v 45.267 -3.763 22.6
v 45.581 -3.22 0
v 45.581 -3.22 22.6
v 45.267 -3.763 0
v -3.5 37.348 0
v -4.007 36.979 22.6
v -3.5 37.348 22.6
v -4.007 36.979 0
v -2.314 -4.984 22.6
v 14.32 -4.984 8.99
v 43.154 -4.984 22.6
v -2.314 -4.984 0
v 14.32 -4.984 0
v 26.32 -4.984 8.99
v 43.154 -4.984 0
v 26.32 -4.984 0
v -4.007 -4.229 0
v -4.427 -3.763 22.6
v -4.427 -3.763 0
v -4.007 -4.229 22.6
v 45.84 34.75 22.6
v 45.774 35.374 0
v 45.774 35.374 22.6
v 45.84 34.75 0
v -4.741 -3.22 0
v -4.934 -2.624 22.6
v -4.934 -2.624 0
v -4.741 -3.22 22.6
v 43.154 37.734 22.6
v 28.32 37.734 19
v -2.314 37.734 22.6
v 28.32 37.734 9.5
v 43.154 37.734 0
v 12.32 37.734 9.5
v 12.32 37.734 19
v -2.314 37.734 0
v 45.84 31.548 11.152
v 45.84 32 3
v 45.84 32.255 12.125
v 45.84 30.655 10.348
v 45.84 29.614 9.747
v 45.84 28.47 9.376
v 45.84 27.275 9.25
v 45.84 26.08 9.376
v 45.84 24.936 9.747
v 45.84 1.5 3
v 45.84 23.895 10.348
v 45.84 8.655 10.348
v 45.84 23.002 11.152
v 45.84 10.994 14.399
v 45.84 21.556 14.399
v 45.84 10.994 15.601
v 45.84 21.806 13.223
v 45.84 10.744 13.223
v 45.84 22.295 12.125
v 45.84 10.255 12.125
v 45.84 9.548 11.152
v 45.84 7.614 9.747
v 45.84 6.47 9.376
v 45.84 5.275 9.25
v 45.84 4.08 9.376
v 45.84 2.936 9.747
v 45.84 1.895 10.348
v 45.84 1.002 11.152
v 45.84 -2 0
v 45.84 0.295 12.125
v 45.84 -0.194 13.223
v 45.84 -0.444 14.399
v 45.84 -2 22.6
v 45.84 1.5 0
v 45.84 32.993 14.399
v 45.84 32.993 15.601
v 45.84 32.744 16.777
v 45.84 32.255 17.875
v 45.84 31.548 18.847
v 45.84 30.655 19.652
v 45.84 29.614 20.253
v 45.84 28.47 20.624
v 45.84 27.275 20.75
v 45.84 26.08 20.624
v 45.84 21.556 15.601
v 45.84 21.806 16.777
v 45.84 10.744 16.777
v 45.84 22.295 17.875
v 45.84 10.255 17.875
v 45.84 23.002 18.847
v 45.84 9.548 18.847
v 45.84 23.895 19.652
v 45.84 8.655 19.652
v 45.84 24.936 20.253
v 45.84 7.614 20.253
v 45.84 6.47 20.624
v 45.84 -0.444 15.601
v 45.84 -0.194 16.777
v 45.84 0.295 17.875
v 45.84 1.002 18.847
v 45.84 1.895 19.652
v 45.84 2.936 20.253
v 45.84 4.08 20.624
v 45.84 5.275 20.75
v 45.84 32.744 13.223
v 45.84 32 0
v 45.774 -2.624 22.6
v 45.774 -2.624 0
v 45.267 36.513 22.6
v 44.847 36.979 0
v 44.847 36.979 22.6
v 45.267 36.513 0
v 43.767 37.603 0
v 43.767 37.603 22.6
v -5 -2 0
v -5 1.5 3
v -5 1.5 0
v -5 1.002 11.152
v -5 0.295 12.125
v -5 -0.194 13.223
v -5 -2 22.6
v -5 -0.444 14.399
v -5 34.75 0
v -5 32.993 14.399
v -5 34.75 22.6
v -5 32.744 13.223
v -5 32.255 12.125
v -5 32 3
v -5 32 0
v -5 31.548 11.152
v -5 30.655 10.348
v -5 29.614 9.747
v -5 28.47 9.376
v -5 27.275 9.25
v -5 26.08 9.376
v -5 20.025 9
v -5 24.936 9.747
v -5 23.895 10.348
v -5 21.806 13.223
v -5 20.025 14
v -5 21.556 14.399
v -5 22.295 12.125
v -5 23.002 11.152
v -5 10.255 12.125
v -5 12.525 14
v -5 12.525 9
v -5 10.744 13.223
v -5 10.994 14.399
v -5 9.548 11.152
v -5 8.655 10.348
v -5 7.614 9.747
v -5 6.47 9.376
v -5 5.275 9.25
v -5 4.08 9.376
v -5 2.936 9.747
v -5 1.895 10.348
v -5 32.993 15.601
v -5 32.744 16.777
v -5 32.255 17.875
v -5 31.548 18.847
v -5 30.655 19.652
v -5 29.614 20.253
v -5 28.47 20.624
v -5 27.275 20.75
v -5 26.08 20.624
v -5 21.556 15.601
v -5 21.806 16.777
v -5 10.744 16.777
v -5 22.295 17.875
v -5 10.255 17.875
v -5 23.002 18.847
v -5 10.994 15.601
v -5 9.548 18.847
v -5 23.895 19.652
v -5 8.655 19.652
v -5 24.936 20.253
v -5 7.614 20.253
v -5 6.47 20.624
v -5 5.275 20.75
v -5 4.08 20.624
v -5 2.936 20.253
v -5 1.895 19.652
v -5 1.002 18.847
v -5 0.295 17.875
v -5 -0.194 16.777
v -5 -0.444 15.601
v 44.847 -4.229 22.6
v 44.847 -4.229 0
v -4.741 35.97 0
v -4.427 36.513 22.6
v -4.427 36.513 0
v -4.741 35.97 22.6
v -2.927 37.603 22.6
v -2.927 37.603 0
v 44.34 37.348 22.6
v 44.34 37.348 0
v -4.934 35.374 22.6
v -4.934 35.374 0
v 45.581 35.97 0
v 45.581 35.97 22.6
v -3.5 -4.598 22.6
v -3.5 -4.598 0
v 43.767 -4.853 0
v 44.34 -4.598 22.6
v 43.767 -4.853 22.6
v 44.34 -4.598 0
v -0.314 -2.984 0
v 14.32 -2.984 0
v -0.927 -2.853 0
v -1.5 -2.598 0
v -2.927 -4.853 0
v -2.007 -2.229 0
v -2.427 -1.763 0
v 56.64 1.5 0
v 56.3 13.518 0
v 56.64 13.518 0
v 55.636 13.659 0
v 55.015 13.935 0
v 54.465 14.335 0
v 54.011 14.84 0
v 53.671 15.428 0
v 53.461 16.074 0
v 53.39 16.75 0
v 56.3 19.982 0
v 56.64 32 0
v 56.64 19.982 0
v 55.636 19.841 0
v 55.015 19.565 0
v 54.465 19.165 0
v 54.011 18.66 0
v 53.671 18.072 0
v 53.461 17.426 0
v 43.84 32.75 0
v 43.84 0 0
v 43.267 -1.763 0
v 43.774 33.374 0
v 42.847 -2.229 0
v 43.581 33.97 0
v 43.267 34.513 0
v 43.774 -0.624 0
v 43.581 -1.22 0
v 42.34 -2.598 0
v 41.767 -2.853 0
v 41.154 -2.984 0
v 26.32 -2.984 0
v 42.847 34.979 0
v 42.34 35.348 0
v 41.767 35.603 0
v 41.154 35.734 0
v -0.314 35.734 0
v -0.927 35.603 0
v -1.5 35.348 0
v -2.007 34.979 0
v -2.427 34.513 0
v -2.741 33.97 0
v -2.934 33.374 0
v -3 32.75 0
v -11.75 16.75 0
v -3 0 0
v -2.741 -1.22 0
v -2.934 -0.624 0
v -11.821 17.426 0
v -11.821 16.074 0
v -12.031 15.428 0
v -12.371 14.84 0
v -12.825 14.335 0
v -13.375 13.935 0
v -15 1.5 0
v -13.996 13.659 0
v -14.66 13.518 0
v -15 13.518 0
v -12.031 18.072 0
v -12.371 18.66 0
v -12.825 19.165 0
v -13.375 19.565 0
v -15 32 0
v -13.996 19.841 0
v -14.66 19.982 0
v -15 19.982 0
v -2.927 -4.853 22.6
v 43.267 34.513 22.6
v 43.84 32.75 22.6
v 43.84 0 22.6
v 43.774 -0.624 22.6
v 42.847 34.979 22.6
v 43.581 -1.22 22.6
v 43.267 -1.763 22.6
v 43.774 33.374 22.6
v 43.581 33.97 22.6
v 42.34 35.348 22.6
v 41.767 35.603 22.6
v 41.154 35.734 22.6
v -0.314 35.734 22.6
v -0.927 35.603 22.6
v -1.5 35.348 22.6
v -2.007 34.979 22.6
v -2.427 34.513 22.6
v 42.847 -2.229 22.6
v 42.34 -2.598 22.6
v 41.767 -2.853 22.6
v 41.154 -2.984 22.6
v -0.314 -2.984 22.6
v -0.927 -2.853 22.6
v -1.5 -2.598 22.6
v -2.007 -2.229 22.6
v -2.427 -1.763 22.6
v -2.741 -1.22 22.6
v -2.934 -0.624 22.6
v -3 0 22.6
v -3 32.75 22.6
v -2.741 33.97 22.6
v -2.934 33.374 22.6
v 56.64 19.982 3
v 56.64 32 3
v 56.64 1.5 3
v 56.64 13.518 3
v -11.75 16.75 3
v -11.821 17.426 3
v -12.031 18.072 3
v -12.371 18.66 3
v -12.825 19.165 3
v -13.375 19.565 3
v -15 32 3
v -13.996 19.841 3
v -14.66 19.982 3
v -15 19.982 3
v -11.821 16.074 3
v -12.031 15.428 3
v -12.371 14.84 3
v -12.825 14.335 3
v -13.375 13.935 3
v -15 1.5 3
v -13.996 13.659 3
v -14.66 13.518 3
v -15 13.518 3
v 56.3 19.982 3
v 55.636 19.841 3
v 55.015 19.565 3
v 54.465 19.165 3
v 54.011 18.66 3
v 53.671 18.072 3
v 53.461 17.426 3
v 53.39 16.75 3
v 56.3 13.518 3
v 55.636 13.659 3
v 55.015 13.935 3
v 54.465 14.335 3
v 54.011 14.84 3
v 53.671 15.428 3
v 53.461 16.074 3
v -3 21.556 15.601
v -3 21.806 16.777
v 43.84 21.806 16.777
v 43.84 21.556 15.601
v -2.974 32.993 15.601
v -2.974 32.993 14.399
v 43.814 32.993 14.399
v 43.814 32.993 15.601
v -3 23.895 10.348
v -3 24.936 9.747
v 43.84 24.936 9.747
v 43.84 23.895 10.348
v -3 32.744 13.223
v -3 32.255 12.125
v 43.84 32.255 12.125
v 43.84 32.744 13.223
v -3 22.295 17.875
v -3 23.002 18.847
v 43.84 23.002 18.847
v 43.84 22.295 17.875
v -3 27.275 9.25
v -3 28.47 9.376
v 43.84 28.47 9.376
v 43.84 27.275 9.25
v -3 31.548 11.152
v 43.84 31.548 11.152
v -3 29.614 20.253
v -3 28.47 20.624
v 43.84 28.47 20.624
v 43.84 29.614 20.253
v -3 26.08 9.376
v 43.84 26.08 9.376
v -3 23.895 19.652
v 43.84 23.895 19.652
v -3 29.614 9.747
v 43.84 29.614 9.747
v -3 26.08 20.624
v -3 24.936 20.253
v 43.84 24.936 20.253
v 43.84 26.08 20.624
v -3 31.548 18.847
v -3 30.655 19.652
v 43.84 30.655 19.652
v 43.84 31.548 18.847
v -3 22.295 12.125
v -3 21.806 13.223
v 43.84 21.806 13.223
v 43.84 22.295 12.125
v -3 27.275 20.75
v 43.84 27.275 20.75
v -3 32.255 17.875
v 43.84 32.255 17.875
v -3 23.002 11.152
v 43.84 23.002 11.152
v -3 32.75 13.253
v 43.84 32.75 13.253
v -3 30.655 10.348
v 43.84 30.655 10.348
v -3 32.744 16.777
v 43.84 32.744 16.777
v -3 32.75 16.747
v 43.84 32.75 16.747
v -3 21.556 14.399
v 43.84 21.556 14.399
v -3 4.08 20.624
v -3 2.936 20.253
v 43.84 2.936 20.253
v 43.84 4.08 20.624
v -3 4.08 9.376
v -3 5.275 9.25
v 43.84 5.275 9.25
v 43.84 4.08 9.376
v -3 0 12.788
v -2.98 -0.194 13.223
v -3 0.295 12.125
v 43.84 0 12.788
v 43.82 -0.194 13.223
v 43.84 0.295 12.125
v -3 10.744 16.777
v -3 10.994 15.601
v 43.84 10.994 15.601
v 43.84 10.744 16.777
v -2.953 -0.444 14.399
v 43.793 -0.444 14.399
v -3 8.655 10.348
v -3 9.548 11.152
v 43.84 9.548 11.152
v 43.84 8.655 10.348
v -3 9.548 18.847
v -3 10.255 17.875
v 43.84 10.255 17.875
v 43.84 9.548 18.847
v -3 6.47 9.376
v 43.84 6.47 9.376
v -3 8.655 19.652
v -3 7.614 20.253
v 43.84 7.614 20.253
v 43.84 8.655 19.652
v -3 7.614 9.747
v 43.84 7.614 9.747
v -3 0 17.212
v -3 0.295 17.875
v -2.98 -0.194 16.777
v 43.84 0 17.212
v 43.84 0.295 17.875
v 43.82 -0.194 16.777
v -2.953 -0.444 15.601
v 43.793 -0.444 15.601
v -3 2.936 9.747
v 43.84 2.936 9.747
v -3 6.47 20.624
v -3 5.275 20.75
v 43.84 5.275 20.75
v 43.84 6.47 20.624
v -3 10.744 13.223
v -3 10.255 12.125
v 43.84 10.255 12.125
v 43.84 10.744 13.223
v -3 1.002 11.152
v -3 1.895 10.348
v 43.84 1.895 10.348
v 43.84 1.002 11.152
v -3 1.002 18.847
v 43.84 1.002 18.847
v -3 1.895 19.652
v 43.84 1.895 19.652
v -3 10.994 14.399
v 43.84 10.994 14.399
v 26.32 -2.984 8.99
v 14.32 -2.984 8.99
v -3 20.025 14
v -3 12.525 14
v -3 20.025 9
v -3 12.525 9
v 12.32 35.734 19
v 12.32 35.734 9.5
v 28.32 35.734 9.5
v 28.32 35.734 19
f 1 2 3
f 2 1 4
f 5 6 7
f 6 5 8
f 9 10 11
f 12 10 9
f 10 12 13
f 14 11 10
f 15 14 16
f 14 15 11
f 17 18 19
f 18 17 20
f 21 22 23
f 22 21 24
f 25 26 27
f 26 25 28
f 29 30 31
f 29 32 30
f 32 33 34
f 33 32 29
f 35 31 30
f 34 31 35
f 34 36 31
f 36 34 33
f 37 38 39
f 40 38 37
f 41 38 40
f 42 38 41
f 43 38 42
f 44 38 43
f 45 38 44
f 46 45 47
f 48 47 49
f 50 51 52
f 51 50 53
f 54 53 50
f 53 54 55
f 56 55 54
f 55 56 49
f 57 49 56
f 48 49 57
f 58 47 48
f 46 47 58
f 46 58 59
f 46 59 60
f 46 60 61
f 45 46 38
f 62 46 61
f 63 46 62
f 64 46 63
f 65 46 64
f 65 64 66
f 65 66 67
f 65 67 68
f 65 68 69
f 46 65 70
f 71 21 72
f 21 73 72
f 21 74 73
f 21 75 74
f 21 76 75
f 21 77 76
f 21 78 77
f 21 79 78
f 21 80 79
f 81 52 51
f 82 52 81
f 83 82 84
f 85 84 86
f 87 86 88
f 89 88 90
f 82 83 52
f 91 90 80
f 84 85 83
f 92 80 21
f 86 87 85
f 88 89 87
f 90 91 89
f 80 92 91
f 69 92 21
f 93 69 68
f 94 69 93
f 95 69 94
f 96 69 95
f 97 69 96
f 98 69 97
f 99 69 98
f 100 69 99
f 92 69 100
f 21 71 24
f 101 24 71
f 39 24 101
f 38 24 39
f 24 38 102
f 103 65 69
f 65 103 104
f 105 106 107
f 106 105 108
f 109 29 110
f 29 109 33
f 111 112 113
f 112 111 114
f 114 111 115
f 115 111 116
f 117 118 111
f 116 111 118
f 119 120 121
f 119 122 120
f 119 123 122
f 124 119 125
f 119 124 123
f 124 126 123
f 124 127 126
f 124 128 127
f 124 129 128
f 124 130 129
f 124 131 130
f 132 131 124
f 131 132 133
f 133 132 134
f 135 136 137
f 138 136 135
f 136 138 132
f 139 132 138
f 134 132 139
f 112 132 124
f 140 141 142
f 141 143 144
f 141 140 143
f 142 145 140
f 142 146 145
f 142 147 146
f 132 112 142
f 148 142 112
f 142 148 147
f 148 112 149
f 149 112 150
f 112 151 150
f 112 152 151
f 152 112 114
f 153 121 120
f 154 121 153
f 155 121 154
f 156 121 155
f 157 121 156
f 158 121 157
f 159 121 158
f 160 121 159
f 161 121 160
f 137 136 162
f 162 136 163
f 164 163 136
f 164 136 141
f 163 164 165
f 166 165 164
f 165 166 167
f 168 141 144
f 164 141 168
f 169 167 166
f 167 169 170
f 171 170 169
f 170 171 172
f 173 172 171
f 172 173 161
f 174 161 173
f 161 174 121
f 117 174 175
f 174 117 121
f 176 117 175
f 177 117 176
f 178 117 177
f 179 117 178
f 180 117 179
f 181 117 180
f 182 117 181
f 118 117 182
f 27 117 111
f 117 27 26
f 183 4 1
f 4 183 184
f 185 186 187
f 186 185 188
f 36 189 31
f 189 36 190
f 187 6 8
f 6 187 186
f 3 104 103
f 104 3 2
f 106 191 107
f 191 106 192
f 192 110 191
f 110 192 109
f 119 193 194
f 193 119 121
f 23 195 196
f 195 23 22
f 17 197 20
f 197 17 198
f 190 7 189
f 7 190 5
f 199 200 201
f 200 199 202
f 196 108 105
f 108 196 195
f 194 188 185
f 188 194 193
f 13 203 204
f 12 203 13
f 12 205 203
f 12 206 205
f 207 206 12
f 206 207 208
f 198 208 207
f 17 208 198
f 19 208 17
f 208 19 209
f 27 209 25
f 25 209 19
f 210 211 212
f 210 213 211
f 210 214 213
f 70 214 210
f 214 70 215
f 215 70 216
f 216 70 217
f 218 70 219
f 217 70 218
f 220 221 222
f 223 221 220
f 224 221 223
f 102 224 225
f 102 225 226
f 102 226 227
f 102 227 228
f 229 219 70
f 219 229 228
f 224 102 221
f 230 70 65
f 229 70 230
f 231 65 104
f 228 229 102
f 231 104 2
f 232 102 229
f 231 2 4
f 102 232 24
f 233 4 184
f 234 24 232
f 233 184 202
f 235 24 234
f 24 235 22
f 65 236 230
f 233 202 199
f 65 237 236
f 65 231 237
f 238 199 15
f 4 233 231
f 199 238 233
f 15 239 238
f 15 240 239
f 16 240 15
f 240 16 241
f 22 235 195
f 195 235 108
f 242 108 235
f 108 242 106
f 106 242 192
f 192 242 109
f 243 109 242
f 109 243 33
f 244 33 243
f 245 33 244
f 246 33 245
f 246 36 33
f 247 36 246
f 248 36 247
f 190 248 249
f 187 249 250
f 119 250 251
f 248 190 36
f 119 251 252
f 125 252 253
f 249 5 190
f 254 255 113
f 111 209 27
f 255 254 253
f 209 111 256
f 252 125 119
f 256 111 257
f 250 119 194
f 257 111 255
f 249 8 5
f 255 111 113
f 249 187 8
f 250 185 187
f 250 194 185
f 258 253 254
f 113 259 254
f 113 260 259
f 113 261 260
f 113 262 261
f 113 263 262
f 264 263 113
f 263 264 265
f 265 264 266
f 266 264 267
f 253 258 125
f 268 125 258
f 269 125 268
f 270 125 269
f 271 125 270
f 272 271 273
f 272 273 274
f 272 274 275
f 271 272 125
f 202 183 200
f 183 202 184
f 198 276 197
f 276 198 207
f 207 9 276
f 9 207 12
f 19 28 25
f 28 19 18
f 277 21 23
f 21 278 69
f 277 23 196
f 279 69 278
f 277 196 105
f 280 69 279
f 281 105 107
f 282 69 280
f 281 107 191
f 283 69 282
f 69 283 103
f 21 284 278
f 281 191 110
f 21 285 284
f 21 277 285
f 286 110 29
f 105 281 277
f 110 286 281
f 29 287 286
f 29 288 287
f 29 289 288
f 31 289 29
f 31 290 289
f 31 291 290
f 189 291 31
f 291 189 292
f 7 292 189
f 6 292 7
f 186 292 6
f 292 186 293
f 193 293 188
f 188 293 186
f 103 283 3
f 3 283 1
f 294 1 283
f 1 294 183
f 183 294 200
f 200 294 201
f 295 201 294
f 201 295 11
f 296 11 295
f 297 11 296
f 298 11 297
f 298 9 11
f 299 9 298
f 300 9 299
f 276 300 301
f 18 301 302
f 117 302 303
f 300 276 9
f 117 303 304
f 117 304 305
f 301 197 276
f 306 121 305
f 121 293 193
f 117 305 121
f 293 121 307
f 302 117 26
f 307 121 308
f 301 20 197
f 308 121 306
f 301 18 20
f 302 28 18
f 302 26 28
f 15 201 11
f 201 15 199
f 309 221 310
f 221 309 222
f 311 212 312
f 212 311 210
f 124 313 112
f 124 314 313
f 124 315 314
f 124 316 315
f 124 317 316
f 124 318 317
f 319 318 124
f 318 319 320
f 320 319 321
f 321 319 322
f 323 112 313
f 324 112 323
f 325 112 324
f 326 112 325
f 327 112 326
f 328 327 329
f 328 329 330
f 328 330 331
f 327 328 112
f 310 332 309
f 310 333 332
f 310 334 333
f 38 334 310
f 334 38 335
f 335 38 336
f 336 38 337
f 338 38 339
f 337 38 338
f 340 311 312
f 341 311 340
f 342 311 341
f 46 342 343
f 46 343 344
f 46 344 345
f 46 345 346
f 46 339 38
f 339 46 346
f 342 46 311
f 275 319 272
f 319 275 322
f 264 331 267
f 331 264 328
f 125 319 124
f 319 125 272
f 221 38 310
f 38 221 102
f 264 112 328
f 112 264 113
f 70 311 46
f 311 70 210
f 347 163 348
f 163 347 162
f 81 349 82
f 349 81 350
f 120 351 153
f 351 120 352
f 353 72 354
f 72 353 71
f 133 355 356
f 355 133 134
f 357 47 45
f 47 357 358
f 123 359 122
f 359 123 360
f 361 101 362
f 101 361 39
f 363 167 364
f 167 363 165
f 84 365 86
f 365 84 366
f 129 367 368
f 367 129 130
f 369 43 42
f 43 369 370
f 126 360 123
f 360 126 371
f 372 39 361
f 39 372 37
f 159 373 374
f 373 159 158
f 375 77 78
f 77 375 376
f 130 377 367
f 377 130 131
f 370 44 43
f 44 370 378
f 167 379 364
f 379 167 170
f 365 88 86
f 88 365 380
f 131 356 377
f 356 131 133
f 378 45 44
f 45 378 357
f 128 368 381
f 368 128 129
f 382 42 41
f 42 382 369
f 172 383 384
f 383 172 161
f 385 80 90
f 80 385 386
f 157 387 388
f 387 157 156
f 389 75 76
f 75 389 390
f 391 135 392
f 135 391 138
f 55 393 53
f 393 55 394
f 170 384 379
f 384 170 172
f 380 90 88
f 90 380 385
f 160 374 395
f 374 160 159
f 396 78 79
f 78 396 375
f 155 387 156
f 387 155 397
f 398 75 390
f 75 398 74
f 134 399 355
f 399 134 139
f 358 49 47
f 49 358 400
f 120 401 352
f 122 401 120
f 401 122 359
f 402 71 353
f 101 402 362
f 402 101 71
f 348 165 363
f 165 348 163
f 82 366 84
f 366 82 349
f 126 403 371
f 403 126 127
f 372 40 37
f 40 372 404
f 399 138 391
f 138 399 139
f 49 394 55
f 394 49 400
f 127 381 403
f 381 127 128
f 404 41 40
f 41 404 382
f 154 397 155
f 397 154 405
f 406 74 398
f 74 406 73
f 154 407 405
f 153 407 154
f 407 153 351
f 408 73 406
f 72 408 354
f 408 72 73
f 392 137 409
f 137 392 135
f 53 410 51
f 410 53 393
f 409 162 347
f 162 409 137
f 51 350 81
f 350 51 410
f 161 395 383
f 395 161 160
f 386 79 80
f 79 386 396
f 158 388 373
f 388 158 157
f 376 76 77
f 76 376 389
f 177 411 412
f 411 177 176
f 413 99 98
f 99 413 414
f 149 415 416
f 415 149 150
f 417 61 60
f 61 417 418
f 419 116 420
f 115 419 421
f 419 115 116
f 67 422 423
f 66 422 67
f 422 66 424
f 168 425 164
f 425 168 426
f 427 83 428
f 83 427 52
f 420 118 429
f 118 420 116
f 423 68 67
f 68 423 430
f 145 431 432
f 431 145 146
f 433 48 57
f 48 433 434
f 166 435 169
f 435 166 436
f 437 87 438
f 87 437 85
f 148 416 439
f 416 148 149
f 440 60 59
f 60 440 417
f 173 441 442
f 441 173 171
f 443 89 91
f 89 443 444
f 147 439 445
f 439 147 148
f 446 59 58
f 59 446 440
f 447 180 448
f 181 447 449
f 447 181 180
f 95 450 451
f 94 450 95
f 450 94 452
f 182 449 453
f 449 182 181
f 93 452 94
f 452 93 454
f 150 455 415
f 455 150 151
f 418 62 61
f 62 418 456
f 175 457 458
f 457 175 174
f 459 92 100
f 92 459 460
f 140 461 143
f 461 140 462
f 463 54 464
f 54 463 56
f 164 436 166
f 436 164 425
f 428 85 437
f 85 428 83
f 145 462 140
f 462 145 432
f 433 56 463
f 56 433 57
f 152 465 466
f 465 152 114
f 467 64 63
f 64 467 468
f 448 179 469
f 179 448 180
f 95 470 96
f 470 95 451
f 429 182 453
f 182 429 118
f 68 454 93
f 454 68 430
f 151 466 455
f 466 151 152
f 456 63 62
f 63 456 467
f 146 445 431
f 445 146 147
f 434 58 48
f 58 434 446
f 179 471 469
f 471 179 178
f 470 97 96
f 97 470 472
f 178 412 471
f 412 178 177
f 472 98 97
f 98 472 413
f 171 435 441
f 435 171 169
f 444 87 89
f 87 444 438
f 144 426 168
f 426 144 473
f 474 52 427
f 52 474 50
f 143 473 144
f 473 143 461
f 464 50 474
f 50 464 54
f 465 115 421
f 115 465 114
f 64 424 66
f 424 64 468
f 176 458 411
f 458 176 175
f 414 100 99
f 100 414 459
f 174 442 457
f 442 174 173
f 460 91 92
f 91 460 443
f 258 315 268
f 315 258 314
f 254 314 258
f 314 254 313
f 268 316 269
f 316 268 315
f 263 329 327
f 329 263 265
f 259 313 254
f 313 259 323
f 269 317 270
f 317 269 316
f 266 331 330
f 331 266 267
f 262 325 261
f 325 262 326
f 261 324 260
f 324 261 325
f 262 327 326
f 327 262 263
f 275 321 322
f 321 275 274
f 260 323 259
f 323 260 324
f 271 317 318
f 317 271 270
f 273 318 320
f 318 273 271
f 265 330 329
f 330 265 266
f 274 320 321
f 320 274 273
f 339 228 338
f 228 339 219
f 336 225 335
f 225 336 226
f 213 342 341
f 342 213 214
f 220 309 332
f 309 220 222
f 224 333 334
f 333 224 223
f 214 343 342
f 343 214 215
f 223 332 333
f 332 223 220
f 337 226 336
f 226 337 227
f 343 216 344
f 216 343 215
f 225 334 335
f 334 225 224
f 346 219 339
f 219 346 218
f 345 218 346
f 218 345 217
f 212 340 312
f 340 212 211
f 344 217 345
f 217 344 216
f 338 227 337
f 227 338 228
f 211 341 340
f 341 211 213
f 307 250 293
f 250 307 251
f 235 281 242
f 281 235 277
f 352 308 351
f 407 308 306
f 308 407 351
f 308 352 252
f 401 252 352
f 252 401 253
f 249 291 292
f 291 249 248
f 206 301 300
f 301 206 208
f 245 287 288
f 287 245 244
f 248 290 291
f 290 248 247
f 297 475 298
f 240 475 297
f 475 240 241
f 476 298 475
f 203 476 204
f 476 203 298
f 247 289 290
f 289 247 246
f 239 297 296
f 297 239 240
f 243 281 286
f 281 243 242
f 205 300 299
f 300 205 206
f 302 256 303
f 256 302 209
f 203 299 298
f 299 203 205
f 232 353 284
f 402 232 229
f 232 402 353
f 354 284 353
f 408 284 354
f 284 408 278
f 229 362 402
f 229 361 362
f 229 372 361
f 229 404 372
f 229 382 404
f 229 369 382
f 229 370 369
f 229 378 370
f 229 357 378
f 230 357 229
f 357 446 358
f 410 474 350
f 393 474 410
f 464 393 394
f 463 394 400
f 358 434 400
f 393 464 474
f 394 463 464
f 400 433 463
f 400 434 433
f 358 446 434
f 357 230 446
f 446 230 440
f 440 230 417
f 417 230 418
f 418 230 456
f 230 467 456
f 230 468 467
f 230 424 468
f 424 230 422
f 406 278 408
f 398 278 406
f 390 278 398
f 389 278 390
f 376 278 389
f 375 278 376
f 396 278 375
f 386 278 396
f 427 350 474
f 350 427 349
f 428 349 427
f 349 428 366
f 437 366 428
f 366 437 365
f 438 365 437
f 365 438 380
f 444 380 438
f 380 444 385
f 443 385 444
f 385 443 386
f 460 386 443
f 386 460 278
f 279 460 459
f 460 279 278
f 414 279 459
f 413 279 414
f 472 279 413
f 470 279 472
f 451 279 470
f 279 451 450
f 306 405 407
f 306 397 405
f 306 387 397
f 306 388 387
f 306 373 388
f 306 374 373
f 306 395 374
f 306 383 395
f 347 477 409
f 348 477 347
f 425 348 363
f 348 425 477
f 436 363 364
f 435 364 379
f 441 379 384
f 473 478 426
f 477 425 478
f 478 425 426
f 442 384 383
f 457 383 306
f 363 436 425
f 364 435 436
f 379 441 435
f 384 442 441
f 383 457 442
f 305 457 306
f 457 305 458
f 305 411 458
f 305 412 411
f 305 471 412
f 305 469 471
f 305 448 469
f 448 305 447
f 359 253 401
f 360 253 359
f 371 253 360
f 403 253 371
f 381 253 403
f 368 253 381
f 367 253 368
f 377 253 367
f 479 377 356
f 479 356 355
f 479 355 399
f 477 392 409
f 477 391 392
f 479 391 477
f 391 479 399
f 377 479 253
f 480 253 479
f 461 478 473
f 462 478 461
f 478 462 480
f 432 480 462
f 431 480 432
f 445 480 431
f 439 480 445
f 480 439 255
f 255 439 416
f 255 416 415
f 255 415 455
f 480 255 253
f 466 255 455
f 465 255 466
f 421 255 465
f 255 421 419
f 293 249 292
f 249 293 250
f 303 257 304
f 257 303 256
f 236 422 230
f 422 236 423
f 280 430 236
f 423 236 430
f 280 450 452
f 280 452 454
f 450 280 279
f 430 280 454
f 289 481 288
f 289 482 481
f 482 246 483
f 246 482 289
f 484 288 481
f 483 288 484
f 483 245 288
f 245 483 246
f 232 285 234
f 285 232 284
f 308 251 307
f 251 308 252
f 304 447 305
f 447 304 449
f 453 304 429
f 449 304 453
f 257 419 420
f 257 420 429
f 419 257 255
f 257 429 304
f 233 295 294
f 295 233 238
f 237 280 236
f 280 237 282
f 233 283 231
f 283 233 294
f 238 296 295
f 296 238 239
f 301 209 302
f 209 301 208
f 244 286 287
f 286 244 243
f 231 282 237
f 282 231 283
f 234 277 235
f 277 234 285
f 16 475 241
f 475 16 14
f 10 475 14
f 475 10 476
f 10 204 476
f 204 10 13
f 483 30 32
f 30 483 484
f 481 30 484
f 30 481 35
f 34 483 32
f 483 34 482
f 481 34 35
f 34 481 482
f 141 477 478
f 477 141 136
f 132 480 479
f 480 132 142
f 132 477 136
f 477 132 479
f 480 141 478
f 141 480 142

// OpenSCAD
// file: ../parameters.scad
maximum_printable_size = 150;

layer_thickness = 0.2;
base_patern = 10;
global_clearance = 0.2;
clearance = global_clearance;


//Screw diameter and nut for M10 [mm]
M10_screw_diameter = 10.4;
M10_head_height = 10;
M10_head_diameter = 16+0.5;
M10_nut_height = 10.5;
M10_nut_diameter = 25.5;
M10_nut_pocket = 22.3;

//Screw diameter for M8 [mm]
M8_screw_diameter = 8.6;
M8_head_height = 8;
M8_head_diameter = 13.5;
M8_nut_height = 7.5;
M8_square_nut_thin_height = 4.5;
M8_nut_diameter = 14.4 + 0.5;
M8_nut_pocket = 13 + 0.5;
M8_washer_diameter = 16;
M8_washer_thickness = 1.5;


//Screw diameter and nut for M6 [mm]
M6_screw_diameter=6.5;
M6_head_diameter = 10+0.5;
M6_head_height = 6;
M6_nut_height = 4.9;
M6_nut_diameter = 11.8;
M6_nut_pocket = 10.4;
M6_square_nut_height = 3;
M6_square_nut_diameter = 10;
M6_washer_thickness = 1.6;

//Screw diameter and nut for M5 [mm]
M5_screw_diameter=5.5;
M5_head_height = 5;
M5_head_diameter = 13+0.5;
M5_nut_height = 4.5;
M5_nut_diameter = 9.4;
M5_nut_pocket = 8.4;

//Screw diameter and nut for M4 [mm]
M4_screw_diameter=4.5;
M4_screw_head_height = 4;
M4_nut_height = 3.2;
M4_nut_diameter = 8.4;
M4_nut_pocket = 7.5;

//Screw diameter and nut for M3 [mm]
M3_screw_diameter = 3.2;
M3_nut_height = 2.7;
M3_nut_diameter = 6.6;
M3_nut_pocket = 5.6;
M3_screw_head_height = 3;

//Screw diameter and nut for M2,5 [mm]
M2_5_screw_diameter = 2.7;
M2_5_nut_height = 2.3;
M2_5_nut_diameter = 6;
M2_5_nut_pocket = 5.5;

// kulove lozisko

bearing_efsm_08_h = 33+1;
bearing_efsm_08_m = 22;
bearing_efsm_08_db = 18;
bearing_efsm_08_ag = 10.5;
bearing_efsm_08_n = M4_screw_diameter;
bearing_efsm_08_a1 = 5.5;
bearing_efsm_08_d = 8.25;
bearing_efsm_08_B = 8; // ball height

bearing_efsm_10_h = 38+1;
bearing_efsm_10_m = 26;
bearing_efsm_10_db = 21.9;
bearing_efsm_10_ag = 12+0.2;
bearing_efsm_10_n = M5_screw_diameter;
bearing_efsm_10_a1 = 6.5;
bearing_efsm_10_d = 10.25;


bearing_efsm_12_width = 40+1;
bearing_efsm_12_h = bearing_efsm_12_width;
bearing_efsm_12_boltd = 28/2; // polovina vzdalenosti mezi srouby
bearing_efsm_12_m = bearing_efsm_12_boltd*2;
bearing_efsm_12_db = 25;
bearing_efsm_12_ag = 13;
bearing_efsm_12_a1 = 7;
bearing_efsm_12_n = M5_screw_diameter;
bearing_efsm_12_d = 12.15;
bearing_efsm_12_B = 10; // ball height
bearing_efsm_space = 1;

bearing_efsm_17_width = 54+1;
bearing_efsm_17_h = bearing_efsm_17_width;
bearing_efsm_17_boltd = 38/2; // polovina vzdalenosti mezi srouby
bearing_efsm_17_m = bearing_efsm_17_boltd*2;
bearing_efsm_17_db = 35;
bearing_efsm_17_ag = 18;
bearing_efsm_17_n = M6_screw_diameter;
bearing_efsm_17_a1 = 10;
bearing_efsm_17_B = 17; // ball height

//limcove lozisko
bearing_EFOM_10_L=26; //celkova sirka zakladny
bearing_EFOM_10_d1=10.3;//diametr otvoru real=10 mm
bearing_EFOM_10_dB=22;//diametr vystupku pro ulozeni lozika
bearing_EFOM_10_H=52;//celková delka zakladny
bearing_EFOM_10_J=36;// hole pitch
bearing_EFOM_10_A1=6.5;//vyska pouzdra
bearing_EFOM_10_Ag=12;//celkova vyska
bearing_EFOM_10_N1=5;//sirka otvoru pro sroub
bearing_EFOM_10_N2=8;//delka otvoru pro sroub
bearing_EFOM_10_m=36;//roztec der pro sroub
bearing_EFOM_10_h=9;//vyska lozika


608_bearing_outer_diameter = 22.3;
608_bearing_inner_diameter = 16;
608_bearing_thickness = 7.1;


// 20 KG servo parameters

servo_20kg_axis_offset = 9.375; // jak je osa mimo stredu
servo_20kg_body_x = 42;
servo_20kg_body_y = 21;
servo_20kg_body_z = 40;
servo_20kg_thread_x = 49/2;
servo_20kg_thread_y = 10/2;
servo_20kg_body_below = 10; // jak hluboko je tělo serva pod drzaky na srouby
servo_20kg_below = 25.8; // jak hluboko je páka serva pod drzaky na srouby

servo_20kg_bolt_d = 2.5+0.3;
servo_20kg_nut_d = 5+0.3;


//strain gauge
strain_gauge_width = 12.7;
strain_gauge_length = 75.1;
strain_gauge_screw_distance = 10;

//ALU profile
ALU_profile_width = 30.5;
ALU_profile_holder_wall_thickness = 3;
ALU_profile_groove_width = 8;

//pillow block bearing
//https://www.igus.eu/product/372
//Part no. KSTM-08
KSTM08_screws_distance = 33;         //m
KSTM08_screws_holes_diameter = 4.5;  //d2
KSTM08_flange_thickness = 6;         //h3
KSTM08_case_width = 9;               //C1
KSTM08_case_length = 47;             //a
KSTM08_ball_width = 12;              //B
KSTM08_ball_hole_diameter = 7.85;    //d1


//ložiska pro malý rotor
bearing_outer_diameter = 10.2;    // Rozměr B1 v nákresu s přídavkem na toleranci otvoru
bearing_thickness = 4;        // Rozměr B2 v nákresu
//bearing_shaft_length = 19.5;    // Rozměr B3 v nákresu, Originalni hodnota 19.5
bearing_shaft_length = 20;    // Rozměr B3 v nákresu


//parametry víčka s telemetrickou anténou
S01_sila_materialu=1.2;
S01_vyska_horni_zavit=10;
S01_hloubka_zavitu=4;
S01_prumer_vnitrni=50;
LO_spodni_prumer=17.2;
LO_vyska_bez_krytu=15;
S01_tolerance_zavit=1.5;
R01_vyska_prekryti_statoru=10;

g3_0_cone1 = 70;
g3_0_srcew_dist = 55;



// scale parameters
base_length = 500;
base_width = 500;
front_tower_offset = 120;
back_tower_offset = 163.5;
tower_height = 375;
tower_angle = atan((base_width/2-ALU_profile_width-10)/tower_height);
tower_arm_length = tower_height/cos(tower_angle);
tower_drag_z_offset = 22;
electro_box_length = 225;
electro_box_width = 165;
electro_box_height = 51.5;

// calibration device parameters
calibration_arm_x_offset = 140;
calibration_arm_y_offset = 50;





// Engine and engine holder parameters

motor_holder_height = base_patern * 5;
motor_holder_thickness = 5;
motor_holder_motor_height = 25;
motor_holder_side_mount_height = base_patern*2.5;
pylon_holder_side_mount_height = base_patern*4.5;

engine_angle = -5; // ongle of engine axis relative to fuselage main axis
engine_diameter = 55;
engine_offset = 53;			// Posun motoru v ose X (dopredu)




// Parametry pro hacek na kabely od motoru
	motor_wire_holder_width = 5;
	motor_wire_holder_height = 10;
	motor_wire_holder_space = 3;
	motor_wire_holder_thickness = 2.5;
	motor_wire_holder_z_shift = 10;
	motor_wire_holder_x_shift = 19;

// Parametry pro ochranny ram nad motorem 
	motor_protective_frame_x_shift = 20;
	motor_protective_frame_z_base = 32;
	motor_protective_frame_beam_width = 5;
	motor_protective_frame_beam_thickness = 3;
	motor_protective_frame_width = base_width-3;
	motor_protective_frame_plug_thickness = 2;
	motor_protective_frame_plug_length = 4;
	motor_protective_frame_thickness = 5;
	motor_protective_frame_z_scale = 0.75;
// main file
include <../parameters.scad>

IMU_diameter = 6;
IMU_width = 38.55;
IMU_height = 22.6;
IMU_length = 46.64;

cable_dia = 10.5+1;
cable_height = 15;
cable_gap = 22;

left_conn_width = 12;
left_conn_height = 9;

right_conn_width = 16;
right_conn_height = 9.5;
right_conn_bot_gap = 7.5;

CAN_conn_width = 7.5;
CAN_conn_height = 5;
CAN_conn_bot_gap = 9;

module IMU_CAN_adapter() {
	difference() {
		// whole body
		union() {
			translate([-2, -2, 0])
			minkowski() {
				cube([IMU_length-IMU_diameter+4.2, IMU_width-IMU_diameter+4.2, 1]);
				cylinder(d=6, h=IMU_height-1, $fn=30);
			}

			translate([-5-10, IMU_diameter/4, 0])
			cube([IMU_length+5+20, ALU_profile_width, 3]);
		}

		// holding screws
		translate([-5-10, ALU_profile_width/2+IMU_diameter/4, -1])
		cylinder(d=M6_screw_diameter, h=5, $fn=30);

		translate([IMU_length+10, ALU_profile_width/2+IMU_diameter/4, -1])
		cylinder(d=M6_screw_diameter, h=5, $fn=30);

		// IMU inside cutout
		translate([0, 0, -1])
		minkowski() {
			cube([IMU_length-IMU_diameter+0.2, IMU_width-IMU_diameter+0.2, 1]);
			cylinder(d=6, h=IMU_height+1, $fn=30);
		}

		// cable holes
		translate([0, 0, cable_height])
		union() {
			rotate([0, 90, 0])
			translate([0, (IMU_width-IMU_diameter+cable_gap)/2, -10])
			cylinder(d=cable_dia, h=IMU_length+10, $fn=30);

			rotate([0, 90, 0])
			translate([0, (IMU_width-IMU_diameter-cable_gap)/2, -10])
			cylinder(d=cable_dia, h=IMU_length+10, $fn=30);
		}

		// left connector hole
		translate([-3+IMU_length/2-left_conn_width/2, -5, -.01])
		cube([left_conn_width, 10, left_conn_height]);

		// right connector hole
		translate([-3+IMU_length/2-right_conn_width/2, -5+IMU_width, right_conn_height])
		cube([right_conn_width, 10, right_conn_height]);

		// right connector hole
		translate([-7, -3+IMU_width/2-CAN_conn_width/2, CAN_conn_bot_gap])
		cube([10, CAN_conn_width, CAN_conn_height]);
	}
}

IMU_CAN_adapter();
